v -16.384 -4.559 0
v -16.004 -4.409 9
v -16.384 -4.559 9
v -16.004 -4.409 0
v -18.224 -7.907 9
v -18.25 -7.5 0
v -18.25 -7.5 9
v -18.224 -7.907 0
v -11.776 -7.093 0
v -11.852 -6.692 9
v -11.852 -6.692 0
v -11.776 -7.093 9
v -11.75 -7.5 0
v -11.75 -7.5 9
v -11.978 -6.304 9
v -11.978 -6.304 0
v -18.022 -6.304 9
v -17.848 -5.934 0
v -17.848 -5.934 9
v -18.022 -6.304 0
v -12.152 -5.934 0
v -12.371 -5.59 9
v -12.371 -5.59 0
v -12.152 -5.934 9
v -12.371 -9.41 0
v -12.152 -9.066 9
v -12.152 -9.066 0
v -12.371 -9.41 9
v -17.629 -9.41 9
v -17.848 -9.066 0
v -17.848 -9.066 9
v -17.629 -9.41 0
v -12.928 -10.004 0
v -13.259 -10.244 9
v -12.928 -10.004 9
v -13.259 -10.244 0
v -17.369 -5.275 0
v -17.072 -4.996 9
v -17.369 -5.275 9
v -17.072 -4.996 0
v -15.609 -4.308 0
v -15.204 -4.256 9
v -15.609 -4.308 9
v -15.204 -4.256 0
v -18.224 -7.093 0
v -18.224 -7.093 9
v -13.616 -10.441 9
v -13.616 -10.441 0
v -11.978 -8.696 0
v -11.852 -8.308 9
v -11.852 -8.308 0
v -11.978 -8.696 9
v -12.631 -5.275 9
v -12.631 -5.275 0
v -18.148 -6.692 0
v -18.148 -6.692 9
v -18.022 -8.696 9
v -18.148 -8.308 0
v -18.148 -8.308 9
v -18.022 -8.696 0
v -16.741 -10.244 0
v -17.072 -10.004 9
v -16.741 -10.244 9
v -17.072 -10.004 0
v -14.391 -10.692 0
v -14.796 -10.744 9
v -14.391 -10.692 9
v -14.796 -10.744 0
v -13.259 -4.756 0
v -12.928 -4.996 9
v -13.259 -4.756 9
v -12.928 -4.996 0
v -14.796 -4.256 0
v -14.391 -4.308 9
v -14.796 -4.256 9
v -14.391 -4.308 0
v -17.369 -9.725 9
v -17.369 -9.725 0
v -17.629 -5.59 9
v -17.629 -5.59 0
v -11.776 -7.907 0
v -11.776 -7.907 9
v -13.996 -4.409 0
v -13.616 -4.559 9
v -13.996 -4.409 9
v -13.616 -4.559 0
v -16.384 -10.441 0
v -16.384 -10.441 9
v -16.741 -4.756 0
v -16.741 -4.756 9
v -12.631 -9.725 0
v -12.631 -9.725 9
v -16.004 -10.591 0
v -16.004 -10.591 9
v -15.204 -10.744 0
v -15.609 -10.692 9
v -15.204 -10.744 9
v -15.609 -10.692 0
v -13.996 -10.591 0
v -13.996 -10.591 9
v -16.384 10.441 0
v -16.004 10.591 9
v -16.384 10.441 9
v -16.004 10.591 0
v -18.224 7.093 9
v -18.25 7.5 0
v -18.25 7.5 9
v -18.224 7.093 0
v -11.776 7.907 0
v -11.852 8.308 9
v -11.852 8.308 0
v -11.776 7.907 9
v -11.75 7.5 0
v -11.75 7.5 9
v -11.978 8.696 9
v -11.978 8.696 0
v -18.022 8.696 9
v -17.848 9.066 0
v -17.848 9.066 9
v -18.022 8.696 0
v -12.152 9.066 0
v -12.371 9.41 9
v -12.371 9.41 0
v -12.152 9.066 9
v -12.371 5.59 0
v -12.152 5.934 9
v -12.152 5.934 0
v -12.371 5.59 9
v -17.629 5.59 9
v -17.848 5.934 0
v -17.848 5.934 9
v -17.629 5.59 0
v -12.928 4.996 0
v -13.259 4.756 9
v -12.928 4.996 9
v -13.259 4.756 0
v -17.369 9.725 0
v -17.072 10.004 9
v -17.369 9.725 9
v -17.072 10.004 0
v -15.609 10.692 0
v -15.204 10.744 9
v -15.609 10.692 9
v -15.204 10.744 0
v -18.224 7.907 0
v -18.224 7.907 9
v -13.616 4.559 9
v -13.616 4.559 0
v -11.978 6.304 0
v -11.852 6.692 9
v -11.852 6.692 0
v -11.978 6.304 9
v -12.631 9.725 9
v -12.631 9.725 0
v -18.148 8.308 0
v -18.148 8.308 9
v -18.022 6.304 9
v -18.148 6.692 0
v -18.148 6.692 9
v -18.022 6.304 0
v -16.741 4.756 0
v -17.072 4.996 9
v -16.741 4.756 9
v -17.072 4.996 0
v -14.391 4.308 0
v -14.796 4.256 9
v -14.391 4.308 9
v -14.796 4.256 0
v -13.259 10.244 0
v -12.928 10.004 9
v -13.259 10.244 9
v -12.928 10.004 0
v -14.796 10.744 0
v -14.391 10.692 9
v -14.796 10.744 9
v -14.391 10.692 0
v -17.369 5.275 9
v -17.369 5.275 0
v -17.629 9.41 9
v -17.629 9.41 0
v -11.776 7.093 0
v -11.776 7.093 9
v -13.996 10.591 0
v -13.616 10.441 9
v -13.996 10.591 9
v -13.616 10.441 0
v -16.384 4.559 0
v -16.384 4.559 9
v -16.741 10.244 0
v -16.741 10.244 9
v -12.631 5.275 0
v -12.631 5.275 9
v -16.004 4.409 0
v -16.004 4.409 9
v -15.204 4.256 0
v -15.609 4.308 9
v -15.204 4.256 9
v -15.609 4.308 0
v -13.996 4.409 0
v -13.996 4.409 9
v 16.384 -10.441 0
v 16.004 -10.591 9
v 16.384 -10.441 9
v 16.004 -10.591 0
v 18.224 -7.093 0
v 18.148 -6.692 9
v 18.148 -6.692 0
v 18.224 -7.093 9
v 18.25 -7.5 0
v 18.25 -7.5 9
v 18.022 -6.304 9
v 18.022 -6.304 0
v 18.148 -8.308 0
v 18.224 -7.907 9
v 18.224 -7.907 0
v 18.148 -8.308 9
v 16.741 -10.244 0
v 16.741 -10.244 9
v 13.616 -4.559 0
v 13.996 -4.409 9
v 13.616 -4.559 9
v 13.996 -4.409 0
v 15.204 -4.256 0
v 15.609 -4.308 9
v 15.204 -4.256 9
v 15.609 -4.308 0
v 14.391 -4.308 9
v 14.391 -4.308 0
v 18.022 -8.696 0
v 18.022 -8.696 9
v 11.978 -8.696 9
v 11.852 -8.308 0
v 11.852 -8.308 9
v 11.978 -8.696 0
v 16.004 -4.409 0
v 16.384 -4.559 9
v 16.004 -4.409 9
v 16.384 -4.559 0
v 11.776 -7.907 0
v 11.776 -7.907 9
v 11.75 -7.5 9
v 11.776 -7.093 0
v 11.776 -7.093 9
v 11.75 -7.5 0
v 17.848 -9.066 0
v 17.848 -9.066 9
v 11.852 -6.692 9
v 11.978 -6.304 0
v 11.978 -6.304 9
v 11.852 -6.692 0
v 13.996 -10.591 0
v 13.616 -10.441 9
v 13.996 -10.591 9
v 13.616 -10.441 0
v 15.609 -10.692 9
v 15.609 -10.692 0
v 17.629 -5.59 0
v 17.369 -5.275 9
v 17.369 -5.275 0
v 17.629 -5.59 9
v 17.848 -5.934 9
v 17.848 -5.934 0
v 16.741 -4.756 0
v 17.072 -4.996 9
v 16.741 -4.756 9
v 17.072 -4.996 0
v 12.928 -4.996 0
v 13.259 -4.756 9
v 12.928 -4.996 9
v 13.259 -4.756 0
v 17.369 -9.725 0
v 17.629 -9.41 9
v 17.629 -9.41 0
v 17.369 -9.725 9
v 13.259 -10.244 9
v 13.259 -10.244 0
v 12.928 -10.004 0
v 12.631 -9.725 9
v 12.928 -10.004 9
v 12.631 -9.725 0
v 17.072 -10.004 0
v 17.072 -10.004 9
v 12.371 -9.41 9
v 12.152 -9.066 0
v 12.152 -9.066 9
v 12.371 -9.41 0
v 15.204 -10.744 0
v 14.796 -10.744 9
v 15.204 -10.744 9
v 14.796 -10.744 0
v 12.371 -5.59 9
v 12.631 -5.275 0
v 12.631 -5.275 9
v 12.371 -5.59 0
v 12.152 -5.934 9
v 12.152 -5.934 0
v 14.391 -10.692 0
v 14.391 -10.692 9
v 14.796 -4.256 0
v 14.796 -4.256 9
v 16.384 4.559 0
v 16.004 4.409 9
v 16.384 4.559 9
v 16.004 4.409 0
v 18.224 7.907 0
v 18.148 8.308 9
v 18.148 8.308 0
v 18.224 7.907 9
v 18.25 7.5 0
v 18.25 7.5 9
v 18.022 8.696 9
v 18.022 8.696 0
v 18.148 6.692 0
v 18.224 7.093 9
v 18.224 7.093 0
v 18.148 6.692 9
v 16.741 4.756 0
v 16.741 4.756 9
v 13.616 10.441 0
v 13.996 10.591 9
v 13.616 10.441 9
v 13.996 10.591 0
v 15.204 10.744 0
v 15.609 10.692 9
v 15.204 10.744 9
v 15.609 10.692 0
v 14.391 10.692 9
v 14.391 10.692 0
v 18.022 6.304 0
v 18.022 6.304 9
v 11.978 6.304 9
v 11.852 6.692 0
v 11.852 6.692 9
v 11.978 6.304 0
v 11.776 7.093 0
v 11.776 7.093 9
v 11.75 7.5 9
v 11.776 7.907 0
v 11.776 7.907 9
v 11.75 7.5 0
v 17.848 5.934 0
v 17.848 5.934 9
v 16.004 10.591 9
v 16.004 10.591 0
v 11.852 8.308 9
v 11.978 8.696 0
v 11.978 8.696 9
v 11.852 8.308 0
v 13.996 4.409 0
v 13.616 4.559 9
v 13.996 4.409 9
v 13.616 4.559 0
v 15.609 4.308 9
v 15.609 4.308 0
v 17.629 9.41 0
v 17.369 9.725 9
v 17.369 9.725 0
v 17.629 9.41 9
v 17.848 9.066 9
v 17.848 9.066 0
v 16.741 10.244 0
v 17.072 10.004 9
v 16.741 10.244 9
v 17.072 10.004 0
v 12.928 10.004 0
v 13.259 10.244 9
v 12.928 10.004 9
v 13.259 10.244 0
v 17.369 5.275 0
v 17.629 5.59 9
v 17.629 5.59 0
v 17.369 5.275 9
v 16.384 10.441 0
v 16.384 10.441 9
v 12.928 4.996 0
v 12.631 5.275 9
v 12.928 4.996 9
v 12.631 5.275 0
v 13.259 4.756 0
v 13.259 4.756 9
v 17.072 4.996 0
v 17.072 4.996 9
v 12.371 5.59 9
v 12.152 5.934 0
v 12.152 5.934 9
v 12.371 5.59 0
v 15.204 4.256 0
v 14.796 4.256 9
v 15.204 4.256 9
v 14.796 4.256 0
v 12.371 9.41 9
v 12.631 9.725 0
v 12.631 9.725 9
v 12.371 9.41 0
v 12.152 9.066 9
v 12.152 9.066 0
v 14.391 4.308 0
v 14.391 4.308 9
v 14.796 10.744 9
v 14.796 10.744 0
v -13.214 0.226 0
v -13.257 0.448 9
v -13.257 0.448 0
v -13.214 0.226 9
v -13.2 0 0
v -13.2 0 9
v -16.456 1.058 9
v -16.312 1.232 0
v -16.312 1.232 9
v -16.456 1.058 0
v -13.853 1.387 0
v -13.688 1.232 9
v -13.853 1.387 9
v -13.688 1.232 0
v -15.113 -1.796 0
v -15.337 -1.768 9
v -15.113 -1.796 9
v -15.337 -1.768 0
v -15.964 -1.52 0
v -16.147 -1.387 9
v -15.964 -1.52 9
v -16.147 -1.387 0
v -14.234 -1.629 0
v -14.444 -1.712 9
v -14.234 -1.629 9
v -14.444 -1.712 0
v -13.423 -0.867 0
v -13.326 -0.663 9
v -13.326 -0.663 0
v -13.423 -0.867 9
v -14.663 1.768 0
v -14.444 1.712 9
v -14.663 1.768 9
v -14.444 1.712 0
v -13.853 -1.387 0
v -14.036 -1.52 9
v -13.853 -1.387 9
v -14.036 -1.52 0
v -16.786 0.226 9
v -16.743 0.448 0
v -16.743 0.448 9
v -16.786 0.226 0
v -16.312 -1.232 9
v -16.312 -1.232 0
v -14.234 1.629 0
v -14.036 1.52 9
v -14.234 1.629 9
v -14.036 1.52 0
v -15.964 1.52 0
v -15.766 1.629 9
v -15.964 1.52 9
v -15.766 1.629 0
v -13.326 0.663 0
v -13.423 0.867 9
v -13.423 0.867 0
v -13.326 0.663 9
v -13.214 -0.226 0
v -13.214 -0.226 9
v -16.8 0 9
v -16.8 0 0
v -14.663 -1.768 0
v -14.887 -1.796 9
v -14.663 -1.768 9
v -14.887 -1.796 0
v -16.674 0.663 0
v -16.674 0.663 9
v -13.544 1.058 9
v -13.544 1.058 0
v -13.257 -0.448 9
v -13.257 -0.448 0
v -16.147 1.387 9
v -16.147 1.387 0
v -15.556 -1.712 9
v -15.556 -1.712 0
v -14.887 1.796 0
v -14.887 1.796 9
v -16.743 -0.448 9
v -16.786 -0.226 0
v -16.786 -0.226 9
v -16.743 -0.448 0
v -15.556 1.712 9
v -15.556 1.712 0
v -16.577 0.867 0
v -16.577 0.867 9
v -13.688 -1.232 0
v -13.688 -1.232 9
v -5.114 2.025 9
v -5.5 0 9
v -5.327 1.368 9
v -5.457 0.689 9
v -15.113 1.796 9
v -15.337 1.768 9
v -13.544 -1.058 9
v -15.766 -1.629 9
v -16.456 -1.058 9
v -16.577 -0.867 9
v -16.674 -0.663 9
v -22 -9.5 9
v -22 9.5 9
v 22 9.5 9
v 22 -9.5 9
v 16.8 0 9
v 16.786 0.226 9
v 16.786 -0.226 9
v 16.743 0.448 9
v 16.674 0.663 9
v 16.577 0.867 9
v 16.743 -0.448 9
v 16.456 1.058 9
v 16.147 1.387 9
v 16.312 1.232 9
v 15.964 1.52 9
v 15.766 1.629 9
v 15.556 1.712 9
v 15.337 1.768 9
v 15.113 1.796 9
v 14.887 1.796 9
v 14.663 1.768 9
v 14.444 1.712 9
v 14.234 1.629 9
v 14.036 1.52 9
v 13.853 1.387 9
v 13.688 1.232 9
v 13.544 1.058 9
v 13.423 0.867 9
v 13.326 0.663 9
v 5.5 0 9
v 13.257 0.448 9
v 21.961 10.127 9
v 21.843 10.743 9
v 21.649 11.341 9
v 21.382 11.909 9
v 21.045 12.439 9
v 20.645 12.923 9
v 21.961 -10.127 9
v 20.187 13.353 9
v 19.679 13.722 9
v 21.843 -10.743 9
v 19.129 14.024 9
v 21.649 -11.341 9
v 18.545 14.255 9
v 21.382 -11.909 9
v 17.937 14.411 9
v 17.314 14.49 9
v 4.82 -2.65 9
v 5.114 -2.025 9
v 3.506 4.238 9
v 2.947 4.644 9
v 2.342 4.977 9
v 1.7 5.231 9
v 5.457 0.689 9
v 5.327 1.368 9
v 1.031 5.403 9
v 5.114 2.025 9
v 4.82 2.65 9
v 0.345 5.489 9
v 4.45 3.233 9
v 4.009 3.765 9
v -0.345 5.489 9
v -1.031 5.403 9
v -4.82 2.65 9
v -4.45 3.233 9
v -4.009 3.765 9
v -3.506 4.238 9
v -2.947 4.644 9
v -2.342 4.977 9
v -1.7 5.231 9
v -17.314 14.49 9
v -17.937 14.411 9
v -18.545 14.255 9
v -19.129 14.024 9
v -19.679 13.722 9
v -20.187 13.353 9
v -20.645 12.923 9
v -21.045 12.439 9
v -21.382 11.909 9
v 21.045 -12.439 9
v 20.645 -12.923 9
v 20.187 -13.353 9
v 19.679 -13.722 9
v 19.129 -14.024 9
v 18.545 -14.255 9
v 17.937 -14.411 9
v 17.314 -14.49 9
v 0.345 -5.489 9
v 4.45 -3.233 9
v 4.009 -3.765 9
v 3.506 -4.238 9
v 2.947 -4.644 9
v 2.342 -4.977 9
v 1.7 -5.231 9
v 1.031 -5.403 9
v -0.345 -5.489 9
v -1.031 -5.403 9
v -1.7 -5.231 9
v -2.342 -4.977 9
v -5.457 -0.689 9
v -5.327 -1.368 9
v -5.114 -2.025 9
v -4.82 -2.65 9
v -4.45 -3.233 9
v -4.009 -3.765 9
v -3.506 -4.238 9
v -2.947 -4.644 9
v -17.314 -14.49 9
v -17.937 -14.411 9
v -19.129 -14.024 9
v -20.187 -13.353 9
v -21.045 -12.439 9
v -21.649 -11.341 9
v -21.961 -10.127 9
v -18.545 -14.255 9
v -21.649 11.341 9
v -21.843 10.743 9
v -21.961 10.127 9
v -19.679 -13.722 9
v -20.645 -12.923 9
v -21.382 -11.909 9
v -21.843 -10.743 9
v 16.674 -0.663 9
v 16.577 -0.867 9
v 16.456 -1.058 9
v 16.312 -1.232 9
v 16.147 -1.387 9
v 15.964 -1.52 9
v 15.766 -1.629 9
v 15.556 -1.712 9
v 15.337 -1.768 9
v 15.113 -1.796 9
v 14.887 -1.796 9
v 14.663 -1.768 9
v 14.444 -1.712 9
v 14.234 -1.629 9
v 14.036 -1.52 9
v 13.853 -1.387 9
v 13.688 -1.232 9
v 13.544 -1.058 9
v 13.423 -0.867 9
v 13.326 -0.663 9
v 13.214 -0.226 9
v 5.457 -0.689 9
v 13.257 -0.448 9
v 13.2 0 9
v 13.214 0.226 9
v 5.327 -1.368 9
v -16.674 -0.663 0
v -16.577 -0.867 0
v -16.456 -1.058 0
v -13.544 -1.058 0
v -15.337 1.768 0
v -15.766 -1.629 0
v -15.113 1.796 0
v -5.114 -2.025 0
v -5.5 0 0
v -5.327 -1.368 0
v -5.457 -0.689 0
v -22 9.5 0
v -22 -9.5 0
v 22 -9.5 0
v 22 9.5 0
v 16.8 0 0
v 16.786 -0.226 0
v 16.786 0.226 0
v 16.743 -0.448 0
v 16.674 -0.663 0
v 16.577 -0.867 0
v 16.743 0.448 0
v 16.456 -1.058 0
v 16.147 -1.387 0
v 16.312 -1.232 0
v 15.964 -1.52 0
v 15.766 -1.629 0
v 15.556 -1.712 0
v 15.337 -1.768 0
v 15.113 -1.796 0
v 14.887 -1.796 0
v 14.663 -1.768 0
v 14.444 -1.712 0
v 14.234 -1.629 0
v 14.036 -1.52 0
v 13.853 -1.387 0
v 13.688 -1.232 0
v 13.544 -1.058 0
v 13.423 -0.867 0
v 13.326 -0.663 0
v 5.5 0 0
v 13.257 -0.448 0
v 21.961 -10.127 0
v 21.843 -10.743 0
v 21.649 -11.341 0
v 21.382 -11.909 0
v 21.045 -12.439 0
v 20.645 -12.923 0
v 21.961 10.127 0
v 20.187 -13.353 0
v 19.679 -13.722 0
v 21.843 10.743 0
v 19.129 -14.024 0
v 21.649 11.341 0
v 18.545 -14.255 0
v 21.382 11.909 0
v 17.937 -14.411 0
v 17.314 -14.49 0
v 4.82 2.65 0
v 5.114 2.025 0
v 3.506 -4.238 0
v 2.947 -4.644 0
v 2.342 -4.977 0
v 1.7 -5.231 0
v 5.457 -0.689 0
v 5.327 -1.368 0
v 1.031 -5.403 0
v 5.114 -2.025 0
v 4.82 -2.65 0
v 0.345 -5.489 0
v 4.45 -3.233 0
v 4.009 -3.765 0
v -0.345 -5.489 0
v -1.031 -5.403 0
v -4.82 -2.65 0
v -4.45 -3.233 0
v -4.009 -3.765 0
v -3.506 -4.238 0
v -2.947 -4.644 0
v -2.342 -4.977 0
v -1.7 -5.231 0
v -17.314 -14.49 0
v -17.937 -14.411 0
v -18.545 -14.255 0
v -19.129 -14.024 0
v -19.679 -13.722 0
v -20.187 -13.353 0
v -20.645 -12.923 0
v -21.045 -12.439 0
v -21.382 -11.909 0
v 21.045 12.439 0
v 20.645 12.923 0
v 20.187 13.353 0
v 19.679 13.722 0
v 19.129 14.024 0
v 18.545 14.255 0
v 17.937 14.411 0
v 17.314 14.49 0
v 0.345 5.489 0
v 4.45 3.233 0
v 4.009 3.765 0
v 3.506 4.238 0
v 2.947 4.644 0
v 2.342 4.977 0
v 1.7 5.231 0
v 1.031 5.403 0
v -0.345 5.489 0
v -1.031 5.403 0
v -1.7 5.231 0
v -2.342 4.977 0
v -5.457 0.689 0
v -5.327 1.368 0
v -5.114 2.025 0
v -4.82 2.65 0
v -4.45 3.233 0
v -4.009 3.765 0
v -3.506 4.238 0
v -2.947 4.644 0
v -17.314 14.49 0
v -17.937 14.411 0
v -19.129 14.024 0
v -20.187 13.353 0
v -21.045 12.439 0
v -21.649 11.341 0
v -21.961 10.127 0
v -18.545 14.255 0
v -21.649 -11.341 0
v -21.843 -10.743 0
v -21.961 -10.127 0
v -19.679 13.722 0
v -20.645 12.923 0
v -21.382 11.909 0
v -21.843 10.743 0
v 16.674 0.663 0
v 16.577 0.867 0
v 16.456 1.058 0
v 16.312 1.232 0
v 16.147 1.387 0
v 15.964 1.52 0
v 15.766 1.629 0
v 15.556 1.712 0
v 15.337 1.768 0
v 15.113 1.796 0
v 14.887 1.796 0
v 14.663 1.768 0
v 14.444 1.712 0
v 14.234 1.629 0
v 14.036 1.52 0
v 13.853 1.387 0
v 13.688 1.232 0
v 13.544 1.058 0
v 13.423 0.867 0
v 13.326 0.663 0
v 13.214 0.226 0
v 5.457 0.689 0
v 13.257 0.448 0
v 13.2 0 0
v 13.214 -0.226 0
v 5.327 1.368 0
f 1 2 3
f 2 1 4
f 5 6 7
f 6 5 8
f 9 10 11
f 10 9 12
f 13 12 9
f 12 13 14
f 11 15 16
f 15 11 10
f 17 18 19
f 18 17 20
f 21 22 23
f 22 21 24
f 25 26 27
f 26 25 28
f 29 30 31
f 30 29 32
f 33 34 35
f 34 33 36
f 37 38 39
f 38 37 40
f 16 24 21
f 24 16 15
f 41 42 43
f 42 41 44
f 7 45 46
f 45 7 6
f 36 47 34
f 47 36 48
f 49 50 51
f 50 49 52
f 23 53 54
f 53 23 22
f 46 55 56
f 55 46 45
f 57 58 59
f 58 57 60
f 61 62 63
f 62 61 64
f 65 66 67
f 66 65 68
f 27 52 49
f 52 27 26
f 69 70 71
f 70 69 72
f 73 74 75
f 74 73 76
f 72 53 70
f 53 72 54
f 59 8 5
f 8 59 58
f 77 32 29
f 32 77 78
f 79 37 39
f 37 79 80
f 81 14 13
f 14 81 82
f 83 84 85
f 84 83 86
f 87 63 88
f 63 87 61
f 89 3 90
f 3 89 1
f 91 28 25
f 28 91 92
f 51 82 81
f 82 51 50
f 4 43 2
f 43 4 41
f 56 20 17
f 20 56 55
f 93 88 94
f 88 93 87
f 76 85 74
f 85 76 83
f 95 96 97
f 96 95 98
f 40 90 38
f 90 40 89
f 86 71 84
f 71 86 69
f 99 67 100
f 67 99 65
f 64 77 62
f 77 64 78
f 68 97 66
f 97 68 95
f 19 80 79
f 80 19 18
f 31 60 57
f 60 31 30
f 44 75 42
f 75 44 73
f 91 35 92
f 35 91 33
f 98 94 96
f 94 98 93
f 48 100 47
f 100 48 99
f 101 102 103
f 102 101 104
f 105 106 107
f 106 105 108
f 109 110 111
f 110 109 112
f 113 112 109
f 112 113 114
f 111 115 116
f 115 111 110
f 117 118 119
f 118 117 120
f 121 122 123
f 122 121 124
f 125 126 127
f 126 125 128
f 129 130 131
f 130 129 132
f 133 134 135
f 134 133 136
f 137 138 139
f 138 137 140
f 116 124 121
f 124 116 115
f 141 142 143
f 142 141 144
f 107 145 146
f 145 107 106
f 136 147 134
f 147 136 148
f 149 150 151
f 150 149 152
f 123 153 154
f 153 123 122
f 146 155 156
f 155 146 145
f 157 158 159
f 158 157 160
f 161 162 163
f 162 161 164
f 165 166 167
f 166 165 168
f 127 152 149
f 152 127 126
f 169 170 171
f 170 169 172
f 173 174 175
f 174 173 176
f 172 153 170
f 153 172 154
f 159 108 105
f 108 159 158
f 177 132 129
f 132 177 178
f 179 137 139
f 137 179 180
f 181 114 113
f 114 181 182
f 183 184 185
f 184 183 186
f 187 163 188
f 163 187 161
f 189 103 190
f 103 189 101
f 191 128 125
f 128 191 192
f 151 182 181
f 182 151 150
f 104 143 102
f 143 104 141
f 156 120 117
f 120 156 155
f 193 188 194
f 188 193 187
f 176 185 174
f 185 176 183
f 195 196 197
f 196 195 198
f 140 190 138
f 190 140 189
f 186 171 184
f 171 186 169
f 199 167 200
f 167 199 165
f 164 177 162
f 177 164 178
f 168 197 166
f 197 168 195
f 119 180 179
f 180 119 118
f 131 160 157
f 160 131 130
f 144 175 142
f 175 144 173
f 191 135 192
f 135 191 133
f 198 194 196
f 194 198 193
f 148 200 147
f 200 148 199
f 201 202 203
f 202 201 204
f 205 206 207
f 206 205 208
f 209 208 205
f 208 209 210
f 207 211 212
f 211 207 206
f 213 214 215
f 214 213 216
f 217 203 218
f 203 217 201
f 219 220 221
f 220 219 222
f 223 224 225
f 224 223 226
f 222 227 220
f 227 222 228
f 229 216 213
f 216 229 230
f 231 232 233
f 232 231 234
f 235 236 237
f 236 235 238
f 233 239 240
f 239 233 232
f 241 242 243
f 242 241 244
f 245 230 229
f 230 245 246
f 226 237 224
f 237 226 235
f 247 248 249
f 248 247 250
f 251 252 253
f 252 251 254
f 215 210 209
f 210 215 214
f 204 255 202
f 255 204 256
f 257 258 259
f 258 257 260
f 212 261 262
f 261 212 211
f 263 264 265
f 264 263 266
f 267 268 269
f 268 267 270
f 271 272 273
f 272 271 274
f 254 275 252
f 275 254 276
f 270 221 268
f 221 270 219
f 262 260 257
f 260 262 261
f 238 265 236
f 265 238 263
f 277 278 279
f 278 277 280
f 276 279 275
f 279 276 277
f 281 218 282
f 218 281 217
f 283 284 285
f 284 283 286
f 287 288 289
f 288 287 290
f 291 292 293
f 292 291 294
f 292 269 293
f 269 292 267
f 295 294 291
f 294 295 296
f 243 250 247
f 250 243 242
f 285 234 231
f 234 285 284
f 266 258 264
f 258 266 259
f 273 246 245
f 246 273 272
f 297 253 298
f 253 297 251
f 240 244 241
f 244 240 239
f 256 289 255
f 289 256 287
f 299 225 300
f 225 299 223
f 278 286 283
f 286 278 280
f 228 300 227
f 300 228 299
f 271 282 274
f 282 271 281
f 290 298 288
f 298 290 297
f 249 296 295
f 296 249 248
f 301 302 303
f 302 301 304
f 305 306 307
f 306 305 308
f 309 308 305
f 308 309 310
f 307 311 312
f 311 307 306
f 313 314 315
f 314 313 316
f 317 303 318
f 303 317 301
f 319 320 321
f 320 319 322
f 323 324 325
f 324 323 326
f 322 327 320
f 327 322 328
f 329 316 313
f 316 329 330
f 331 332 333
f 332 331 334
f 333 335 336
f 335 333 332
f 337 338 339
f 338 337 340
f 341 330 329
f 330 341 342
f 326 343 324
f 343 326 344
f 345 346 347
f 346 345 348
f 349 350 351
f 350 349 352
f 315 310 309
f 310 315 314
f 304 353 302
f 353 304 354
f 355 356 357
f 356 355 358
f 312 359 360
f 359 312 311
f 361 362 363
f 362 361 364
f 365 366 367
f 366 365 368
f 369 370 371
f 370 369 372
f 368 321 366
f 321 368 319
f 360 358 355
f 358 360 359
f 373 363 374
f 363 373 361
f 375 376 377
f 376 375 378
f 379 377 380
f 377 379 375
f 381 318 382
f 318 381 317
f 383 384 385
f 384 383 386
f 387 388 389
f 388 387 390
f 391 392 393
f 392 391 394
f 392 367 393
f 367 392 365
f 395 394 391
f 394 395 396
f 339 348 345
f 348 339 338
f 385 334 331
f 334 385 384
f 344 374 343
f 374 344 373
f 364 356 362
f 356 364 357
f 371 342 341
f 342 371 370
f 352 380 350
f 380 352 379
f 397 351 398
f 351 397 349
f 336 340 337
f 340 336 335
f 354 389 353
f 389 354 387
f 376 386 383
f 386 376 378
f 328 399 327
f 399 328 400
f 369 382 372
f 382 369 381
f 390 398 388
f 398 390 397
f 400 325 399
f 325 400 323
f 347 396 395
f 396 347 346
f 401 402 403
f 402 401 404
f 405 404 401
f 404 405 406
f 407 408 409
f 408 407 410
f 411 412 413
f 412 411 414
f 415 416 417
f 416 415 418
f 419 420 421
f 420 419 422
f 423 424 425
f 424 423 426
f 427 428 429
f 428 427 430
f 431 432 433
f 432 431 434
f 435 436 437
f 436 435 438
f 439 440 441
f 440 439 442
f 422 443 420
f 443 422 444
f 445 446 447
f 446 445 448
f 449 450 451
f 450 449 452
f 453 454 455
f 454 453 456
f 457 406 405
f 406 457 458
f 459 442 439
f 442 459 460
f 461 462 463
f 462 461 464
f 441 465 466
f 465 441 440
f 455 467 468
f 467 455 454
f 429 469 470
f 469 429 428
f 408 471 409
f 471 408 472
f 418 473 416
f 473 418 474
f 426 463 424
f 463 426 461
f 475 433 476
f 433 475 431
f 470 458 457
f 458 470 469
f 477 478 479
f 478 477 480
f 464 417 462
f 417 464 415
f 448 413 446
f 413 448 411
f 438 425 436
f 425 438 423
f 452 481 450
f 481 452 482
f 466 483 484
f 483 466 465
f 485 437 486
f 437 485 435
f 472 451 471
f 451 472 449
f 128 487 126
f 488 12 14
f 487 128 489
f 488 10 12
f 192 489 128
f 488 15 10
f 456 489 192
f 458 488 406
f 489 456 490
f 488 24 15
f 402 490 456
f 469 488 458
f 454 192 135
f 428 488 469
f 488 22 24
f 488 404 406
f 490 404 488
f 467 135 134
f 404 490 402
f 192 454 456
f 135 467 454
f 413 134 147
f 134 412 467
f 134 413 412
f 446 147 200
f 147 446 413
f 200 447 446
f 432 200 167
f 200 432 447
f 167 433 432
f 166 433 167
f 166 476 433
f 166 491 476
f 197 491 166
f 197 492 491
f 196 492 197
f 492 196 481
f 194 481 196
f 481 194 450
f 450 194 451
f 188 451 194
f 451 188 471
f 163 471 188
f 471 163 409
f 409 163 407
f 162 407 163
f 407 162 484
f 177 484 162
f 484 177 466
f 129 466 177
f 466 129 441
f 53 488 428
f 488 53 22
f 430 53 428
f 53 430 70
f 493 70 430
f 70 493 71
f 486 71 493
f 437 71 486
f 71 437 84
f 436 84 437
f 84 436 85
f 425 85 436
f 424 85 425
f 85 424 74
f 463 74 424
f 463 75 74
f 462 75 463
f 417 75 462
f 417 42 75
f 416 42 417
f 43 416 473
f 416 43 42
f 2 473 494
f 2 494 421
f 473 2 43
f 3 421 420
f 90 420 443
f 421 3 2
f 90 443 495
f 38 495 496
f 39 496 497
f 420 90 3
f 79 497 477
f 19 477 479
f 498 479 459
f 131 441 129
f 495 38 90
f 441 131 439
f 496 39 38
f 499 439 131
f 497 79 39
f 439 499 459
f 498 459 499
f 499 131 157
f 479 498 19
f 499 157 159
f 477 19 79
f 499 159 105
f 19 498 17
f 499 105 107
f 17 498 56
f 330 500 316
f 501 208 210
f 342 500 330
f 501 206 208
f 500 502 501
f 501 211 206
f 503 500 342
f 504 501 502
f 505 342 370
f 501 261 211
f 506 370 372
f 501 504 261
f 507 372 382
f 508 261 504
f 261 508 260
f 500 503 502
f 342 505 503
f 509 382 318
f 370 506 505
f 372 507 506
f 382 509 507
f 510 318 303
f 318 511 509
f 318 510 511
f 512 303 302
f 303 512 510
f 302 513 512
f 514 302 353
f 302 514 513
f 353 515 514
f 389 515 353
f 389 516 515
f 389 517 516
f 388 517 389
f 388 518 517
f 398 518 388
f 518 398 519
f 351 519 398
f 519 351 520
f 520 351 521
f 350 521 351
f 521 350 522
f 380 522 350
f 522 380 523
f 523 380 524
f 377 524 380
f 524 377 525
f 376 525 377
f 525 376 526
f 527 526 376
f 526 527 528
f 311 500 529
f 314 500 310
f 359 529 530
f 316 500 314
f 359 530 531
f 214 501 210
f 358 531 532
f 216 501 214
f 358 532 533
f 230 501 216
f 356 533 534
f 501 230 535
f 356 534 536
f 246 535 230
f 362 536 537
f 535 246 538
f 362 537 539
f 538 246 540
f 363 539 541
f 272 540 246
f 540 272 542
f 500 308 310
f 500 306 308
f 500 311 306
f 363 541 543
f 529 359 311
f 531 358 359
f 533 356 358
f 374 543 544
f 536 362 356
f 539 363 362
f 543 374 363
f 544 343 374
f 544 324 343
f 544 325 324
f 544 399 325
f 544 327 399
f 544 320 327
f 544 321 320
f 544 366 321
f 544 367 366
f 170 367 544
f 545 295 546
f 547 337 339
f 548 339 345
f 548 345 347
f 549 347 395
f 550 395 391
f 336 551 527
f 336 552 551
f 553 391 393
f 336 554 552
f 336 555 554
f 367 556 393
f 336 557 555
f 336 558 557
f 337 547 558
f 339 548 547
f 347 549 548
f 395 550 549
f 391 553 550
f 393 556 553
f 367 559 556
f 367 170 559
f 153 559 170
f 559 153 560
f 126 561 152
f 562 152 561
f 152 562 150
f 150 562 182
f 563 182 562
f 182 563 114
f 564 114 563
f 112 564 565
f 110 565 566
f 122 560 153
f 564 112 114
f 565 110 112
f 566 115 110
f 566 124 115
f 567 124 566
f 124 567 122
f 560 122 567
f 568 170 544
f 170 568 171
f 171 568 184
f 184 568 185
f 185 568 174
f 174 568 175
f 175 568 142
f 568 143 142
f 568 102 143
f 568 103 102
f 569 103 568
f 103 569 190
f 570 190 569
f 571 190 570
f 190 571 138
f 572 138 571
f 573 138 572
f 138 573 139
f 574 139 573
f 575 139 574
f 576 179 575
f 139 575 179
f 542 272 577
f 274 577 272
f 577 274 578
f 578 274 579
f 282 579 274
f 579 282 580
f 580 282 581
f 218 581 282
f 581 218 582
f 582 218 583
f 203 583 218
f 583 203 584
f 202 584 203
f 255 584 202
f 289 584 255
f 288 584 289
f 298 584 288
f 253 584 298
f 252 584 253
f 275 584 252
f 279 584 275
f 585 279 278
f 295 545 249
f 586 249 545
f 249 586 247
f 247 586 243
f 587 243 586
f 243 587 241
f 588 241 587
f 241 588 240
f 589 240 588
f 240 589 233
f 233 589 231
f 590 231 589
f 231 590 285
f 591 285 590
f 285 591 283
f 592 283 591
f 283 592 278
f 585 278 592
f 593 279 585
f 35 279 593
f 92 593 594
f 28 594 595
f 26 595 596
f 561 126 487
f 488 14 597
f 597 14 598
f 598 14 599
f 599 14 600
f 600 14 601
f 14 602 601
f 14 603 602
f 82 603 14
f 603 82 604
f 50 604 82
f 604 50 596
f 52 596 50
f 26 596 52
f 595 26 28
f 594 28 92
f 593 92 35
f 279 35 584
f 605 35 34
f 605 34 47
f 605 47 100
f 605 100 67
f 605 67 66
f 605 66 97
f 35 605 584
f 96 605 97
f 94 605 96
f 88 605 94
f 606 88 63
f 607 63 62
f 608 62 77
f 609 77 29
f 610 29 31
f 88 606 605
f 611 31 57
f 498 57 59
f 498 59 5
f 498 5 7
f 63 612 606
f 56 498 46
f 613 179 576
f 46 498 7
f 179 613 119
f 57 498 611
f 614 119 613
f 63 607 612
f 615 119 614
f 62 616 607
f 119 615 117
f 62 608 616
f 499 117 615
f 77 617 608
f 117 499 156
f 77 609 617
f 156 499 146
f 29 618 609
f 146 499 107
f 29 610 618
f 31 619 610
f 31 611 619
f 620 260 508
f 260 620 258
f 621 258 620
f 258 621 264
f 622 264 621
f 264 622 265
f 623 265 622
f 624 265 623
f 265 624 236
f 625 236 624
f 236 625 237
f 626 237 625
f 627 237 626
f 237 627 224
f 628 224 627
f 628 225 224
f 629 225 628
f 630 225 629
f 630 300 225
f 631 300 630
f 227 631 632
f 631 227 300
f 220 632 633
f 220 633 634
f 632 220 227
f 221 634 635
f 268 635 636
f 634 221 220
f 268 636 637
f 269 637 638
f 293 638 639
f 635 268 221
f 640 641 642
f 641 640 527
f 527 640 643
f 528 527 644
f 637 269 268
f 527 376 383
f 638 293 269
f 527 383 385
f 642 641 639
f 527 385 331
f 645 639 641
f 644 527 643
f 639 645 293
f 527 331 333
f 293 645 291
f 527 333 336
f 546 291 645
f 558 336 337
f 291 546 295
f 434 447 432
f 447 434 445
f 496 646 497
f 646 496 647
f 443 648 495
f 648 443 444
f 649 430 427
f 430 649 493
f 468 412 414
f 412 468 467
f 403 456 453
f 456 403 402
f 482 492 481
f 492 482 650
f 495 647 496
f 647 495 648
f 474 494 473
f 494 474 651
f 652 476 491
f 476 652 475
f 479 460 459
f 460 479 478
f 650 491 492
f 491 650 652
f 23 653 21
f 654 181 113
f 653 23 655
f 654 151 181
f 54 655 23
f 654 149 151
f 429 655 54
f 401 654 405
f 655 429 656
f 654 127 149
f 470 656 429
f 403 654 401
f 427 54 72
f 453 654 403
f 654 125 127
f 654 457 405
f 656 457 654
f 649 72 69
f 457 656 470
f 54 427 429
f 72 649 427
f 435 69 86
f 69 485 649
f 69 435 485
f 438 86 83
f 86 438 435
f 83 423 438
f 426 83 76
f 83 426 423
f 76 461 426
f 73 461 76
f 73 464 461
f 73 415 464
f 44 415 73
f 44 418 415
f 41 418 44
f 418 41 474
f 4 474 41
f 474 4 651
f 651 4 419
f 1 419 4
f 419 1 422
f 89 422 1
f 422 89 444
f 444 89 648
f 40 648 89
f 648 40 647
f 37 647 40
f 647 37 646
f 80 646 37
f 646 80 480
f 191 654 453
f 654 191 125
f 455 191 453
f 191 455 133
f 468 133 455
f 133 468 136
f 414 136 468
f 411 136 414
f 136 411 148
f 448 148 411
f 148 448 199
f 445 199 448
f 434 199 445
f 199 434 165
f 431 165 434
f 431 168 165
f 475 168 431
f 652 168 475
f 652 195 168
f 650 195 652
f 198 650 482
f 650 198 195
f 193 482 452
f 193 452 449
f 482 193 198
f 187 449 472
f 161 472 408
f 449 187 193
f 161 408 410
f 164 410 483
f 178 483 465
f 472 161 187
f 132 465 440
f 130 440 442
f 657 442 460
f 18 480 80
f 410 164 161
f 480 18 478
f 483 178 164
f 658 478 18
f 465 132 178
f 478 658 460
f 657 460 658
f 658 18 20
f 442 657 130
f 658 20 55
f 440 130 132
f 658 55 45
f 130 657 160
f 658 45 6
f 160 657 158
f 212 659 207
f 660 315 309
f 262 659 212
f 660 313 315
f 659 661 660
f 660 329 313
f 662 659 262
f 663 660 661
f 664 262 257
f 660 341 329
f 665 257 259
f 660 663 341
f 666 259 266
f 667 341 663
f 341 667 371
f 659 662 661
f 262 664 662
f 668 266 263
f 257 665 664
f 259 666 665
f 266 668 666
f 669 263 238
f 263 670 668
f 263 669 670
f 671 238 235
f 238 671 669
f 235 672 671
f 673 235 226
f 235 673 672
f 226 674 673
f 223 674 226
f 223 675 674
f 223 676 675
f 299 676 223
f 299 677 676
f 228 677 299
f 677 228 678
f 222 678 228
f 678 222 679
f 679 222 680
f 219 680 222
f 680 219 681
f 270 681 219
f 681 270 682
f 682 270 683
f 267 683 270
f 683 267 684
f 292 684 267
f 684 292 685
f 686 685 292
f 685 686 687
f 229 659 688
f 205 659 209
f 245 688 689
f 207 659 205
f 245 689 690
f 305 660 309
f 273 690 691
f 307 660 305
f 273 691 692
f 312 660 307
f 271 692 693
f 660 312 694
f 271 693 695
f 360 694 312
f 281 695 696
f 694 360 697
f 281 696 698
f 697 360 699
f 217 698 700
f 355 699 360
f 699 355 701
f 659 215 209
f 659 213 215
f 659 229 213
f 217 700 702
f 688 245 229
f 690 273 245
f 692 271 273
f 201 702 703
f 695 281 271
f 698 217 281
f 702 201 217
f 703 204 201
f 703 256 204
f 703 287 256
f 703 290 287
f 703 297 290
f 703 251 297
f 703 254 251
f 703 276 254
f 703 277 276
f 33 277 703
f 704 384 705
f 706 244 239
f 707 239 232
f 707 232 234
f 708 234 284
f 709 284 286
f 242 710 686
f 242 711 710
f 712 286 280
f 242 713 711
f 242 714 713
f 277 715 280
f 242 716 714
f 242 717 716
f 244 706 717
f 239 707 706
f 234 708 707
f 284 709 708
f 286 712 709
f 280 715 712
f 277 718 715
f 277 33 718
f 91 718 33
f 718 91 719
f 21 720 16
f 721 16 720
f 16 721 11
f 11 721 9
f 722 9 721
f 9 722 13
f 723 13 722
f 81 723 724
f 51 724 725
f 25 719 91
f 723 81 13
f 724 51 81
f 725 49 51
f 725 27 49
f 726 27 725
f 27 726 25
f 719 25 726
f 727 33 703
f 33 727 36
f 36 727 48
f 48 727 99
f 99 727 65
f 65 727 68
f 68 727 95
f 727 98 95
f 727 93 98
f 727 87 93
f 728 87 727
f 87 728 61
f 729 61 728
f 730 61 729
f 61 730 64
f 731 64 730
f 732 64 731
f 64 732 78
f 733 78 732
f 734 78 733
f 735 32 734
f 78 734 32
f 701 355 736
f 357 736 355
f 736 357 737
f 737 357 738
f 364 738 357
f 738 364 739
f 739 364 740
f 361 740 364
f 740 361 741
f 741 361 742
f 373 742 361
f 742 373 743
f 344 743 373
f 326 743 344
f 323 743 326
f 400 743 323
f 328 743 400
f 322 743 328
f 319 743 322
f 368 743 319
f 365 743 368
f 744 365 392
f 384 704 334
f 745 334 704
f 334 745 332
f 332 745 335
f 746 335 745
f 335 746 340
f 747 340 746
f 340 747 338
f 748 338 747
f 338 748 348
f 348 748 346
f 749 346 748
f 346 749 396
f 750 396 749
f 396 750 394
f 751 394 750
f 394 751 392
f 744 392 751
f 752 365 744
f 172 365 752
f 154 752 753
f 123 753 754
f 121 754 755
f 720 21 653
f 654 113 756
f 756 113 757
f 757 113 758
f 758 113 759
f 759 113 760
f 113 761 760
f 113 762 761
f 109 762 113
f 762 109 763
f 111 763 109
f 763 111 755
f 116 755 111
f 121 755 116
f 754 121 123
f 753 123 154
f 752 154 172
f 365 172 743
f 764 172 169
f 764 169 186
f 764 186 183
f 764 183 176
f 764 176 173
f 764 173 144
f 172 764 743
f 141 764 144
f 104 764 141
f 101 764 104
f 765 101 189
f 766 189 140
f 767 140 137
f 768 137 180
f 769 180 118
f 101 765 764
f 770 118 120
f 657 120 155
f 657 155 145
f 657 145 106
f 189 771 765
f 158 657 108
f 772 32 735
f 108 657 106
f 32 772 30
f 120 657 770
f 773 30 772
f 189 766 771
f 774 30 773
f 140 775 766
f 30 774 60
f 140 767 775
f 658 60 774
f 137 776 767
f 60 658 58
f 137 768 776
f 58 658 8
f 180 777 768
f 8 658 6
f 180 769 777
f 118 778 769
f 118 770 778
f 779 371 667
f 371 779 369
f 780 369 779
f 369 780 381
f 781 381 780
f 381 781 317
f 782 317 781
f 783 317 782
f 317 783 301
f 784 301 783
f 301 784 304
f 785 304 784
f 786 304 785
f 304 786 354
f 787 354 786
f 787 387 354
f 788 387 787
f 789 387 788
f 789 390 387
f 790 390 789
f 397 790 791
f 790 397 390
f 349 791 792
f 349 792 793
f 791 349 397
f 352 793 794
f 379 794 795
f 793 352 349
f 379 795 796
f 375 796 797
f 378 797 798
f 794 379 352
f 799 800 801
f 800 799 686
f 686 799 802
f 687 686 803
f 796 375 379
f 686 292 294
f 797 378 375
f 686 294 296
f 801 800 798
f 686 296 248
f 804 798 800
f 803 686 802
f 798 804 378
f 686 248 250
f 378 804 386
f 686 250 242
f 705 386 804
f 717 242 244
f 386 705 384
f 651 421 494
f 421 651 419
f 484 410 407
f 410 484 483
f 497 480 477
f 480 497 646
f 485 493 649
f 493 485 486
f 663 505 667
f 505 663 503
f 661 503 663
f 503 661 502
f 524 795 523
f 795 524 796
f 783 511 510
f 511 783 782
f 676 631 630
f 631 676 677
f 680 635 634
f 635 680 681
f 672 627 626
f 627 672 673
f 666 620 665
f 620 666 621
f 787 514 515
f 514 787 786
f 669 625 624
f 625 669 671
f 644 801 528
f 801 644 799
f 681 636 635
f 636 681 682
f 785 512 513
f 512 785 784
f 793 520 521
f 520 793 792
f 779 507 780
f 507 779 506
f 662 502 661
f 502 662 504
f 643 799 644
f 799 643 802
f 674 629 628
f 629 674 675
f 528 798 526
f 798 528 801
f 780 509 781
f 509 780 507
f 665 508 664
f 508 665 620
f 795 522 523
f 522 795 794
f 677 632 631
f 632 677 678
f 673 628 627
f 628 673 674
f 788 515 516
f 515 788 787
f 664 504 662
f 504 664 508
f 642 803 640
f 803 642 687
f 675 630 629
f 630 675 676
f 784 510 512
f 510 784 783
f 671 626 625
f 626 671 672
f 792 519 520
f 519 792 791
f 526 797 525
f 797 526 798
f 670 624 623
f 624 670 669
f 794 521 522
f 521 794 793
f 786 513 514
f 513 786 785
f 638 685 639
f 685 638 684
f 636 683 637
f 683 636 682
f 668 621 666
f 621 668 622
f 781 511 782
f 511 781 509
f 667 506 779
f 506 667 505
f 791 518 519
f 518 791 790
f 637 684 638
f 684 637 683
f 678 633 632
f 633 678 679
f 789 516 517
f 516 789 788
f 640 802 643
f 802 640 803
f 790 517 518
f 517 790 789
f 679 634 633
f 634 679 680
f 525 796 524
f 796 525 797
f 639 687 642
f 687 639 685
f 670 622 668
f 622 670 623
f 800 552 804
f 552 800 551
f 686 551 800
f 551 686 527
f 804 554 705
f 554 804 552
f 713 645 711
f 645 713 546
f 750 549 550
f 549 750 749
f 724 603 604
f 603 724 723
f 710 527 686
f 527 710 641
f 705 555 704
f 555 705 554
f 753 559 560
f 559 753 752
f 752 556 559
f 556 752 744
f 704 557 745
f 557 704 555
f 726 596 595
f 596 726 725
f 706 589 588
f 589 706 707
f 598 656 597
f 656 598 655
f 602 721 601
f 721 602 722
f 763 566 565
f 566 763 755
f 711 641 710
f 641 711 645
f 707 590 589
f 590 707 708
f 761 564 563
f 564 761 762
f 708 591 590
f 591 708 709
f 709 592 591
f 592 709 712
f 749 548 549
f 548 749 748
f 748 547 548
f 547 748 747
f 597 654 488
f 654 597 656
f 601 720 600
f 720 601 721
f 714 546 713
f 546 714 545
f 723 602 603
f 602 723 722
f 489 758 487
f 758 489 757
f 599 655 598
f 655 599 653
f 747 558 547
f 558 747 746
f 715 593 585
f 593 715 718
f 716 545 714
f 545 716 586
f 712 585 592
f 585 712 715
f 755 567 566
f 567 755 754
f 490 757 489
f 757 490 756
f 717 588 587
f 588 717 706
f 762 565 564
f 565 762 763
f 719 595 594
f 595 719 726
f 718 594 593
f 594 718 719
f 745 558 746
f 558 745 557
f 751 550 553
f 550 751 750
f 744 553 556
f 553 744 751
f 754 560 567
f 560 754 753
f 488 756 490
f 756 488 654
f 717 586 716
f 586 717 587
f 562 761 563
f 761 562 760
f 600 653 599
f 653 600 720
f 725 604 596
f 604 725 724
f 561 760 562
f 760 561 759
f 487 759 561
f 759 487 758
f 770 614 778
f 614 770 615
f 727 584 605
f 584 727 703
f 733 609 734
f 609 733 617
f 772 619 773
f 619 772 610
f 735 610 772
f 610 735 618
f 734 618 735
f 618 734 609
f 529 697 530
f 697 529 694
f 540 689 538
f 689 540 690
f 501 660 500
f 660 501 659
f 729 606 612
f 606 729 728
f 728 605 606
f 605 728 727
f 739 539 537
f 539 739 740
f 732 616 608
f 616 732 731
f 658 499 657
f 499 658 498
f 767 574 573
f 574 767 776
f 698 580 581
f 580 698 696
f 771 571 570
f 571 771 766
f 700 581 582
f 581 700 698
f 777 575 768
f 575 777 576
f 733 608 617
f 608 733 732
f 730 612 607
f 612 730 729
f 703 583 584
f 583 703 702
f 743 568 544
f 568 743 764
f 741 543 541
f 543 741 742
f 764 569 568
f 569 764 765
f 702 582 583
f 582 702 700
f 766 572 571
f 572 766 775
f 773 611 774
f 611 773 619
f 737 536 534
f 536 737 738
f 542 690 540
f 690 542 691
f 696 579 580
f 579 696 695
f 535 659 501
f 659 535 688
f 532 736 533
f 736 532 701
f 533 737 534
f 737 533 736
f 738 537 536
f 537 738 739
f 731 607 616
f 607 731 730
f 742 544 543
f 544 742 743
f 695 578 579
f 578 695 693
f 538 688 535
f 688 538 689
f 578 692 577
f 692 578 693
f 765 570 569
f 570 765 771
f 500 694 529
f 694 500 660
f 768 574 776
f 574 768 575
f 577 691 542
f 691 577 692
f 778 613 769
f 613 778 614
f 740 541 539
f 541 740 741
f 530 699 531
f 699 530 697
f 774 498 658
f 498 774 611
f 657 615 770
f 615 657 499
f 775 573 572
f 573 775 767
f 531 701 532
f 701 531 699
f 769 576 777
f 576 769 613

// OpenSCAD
$fn = 50;


difference() {
	union() {
		hull() {
			translate(v = [-17.0000000000, 9.5000000000, 0]) {
				cylinder(h = 9, r = 5);
			}
			translate(v = [17.0000000000, 9.5000000000, 0]) {
				cylinder(h = 9, r = 5);
			}
			translate(v = [-17.0000000000, -9.5000000000, 0]) {
				cylinder(h = 9, r = 5);
			}
			translate(v = [17.0000000000, -9.5000000000, 0]) {
				cylinder(h = 9, r = 5);
			}
		}
	}
	union() {
		#translate(v = [-15.0000000000, -7.5000000000, 0]) {
			cylinder(h = 9, r = 3.2500000000);
		}
		#translate(v = [-15.0000000000, 7.5000000000, 0]) {
			cylinder(h = 9, r = 3.2500000000);
		}
		#translate(v = [15.0000000000, -7.5000000000, 0]) {
			cylinder(h = 9, r = 3.2500000000);
		}
		#translate(v = [15.0000000000, 7.5000000000, 0]) {
			cylinder(h = 9, r = 3.2500000000);
		}
		#translate(v = [-15.0000000000, -7.5000000000, -100.0000000000]) {
			cylinder(h = 200, r = 3.2500000000);
		}
		#translate(v = [-15.0000000000, 7.5000000000, -100.0000000000]) {
			cylinder(h = 200, r = 3.2500000000);
		}
		#translate(v = [15.0000000000, -7.5000000000, -100.0000000000]) {
			cylinder(h = 200, r = 3.2500000000);
		}
		#translate(v = [15.0000000000, 7.5000000000, -100.0000000000]) {
			cylinder(h = 200, r = 3.2500000000);
		}
		#translate(v = [-15.0000000000, -7.5000000000, 0]) {
			cylinder(h = 9, r = 1.8000000000);
		}
		#translate(v = [-15.0000000000, 0.0000000000, 0]) {
			cylinder(h = 9, r = 1.8000000000);
		}
		#translate(v = [-15.0000000000, 7.5000000000, 0]) {
			cylinder(h = 9, r = 1.8000000000);
		}
		#translate(v = [15.0000000000, -7.5000000000, 0]) {
			cylinder(h = 9, r = 1.8000000000);
		}
		#translate(v = [15.0000000000, 0.0000000000, 0]) {
			cylinder(h = 9, r = 1.8000000000);
		}
		#translate(v = [15.0000000000, 7.5000000000, 0]) {
			cylinder(h = 9, r = 1.8000000000);
		}
		#translate(v = [-15.0000000000, -7.5000000000, 0]) {
			cylinder(h = 9, r = 1.8000000000);
		}
		#translate(v = [-15.0000000000, 0.0000000000, 0]) {
			cylinder(h = 9, r = 1.8000000000);
		}
		#translate(v = [-15.0000000000, 7.5000000000, 0]) {
			cylinder(h = 9, r = 1.8000000000);
		}
		#translate(v = [15.0000000000, -7.5000000000, 0]) {
			cylinder(h = 9, r = 1.8000000000);
		}
		#translate(v = [15.0000000000, 0.0000000000, 0]) {
			cylinder(h = 9, r = 1.8000000000);
		}
		#translate(v = [15.0000000000, 7.5000000000, 0]) {
			cylinder(h = 9, r = 1.8000000000);
		}
		#translate(v = [-15.0000000000, -7.5000000000, 0]) {
			cylinder(h = 9, r = 1.8000000000);
		}
		#translate(v = [-15.0000000000, 0.0000000000, 0]) {
			cylinder(h = 9, r = 1.8000000000);
		}
		#translate(v = [-15.0000000000, 7.5000000000, 0]) {
			cylinder(h = 9, r = 1.8000000000);
		}
		#translate(v = [15.0000000000, -7.5000000000, 0]) {
			cylinder(h = 9, r = 1.8000000000);
		}
		#translate(v = [15.0000000000, 0.0000000000, 0]) {
			cylinder(h = 9, r = 1.8000000000);
		}
		#translate(v = [15.0000000000, 7.5000000000, 0]) {
			cylinder(h = 9, r = 1.8000000000);
		}
		#cylinder(h = 9, r = 5.5000000000);
	}
}
